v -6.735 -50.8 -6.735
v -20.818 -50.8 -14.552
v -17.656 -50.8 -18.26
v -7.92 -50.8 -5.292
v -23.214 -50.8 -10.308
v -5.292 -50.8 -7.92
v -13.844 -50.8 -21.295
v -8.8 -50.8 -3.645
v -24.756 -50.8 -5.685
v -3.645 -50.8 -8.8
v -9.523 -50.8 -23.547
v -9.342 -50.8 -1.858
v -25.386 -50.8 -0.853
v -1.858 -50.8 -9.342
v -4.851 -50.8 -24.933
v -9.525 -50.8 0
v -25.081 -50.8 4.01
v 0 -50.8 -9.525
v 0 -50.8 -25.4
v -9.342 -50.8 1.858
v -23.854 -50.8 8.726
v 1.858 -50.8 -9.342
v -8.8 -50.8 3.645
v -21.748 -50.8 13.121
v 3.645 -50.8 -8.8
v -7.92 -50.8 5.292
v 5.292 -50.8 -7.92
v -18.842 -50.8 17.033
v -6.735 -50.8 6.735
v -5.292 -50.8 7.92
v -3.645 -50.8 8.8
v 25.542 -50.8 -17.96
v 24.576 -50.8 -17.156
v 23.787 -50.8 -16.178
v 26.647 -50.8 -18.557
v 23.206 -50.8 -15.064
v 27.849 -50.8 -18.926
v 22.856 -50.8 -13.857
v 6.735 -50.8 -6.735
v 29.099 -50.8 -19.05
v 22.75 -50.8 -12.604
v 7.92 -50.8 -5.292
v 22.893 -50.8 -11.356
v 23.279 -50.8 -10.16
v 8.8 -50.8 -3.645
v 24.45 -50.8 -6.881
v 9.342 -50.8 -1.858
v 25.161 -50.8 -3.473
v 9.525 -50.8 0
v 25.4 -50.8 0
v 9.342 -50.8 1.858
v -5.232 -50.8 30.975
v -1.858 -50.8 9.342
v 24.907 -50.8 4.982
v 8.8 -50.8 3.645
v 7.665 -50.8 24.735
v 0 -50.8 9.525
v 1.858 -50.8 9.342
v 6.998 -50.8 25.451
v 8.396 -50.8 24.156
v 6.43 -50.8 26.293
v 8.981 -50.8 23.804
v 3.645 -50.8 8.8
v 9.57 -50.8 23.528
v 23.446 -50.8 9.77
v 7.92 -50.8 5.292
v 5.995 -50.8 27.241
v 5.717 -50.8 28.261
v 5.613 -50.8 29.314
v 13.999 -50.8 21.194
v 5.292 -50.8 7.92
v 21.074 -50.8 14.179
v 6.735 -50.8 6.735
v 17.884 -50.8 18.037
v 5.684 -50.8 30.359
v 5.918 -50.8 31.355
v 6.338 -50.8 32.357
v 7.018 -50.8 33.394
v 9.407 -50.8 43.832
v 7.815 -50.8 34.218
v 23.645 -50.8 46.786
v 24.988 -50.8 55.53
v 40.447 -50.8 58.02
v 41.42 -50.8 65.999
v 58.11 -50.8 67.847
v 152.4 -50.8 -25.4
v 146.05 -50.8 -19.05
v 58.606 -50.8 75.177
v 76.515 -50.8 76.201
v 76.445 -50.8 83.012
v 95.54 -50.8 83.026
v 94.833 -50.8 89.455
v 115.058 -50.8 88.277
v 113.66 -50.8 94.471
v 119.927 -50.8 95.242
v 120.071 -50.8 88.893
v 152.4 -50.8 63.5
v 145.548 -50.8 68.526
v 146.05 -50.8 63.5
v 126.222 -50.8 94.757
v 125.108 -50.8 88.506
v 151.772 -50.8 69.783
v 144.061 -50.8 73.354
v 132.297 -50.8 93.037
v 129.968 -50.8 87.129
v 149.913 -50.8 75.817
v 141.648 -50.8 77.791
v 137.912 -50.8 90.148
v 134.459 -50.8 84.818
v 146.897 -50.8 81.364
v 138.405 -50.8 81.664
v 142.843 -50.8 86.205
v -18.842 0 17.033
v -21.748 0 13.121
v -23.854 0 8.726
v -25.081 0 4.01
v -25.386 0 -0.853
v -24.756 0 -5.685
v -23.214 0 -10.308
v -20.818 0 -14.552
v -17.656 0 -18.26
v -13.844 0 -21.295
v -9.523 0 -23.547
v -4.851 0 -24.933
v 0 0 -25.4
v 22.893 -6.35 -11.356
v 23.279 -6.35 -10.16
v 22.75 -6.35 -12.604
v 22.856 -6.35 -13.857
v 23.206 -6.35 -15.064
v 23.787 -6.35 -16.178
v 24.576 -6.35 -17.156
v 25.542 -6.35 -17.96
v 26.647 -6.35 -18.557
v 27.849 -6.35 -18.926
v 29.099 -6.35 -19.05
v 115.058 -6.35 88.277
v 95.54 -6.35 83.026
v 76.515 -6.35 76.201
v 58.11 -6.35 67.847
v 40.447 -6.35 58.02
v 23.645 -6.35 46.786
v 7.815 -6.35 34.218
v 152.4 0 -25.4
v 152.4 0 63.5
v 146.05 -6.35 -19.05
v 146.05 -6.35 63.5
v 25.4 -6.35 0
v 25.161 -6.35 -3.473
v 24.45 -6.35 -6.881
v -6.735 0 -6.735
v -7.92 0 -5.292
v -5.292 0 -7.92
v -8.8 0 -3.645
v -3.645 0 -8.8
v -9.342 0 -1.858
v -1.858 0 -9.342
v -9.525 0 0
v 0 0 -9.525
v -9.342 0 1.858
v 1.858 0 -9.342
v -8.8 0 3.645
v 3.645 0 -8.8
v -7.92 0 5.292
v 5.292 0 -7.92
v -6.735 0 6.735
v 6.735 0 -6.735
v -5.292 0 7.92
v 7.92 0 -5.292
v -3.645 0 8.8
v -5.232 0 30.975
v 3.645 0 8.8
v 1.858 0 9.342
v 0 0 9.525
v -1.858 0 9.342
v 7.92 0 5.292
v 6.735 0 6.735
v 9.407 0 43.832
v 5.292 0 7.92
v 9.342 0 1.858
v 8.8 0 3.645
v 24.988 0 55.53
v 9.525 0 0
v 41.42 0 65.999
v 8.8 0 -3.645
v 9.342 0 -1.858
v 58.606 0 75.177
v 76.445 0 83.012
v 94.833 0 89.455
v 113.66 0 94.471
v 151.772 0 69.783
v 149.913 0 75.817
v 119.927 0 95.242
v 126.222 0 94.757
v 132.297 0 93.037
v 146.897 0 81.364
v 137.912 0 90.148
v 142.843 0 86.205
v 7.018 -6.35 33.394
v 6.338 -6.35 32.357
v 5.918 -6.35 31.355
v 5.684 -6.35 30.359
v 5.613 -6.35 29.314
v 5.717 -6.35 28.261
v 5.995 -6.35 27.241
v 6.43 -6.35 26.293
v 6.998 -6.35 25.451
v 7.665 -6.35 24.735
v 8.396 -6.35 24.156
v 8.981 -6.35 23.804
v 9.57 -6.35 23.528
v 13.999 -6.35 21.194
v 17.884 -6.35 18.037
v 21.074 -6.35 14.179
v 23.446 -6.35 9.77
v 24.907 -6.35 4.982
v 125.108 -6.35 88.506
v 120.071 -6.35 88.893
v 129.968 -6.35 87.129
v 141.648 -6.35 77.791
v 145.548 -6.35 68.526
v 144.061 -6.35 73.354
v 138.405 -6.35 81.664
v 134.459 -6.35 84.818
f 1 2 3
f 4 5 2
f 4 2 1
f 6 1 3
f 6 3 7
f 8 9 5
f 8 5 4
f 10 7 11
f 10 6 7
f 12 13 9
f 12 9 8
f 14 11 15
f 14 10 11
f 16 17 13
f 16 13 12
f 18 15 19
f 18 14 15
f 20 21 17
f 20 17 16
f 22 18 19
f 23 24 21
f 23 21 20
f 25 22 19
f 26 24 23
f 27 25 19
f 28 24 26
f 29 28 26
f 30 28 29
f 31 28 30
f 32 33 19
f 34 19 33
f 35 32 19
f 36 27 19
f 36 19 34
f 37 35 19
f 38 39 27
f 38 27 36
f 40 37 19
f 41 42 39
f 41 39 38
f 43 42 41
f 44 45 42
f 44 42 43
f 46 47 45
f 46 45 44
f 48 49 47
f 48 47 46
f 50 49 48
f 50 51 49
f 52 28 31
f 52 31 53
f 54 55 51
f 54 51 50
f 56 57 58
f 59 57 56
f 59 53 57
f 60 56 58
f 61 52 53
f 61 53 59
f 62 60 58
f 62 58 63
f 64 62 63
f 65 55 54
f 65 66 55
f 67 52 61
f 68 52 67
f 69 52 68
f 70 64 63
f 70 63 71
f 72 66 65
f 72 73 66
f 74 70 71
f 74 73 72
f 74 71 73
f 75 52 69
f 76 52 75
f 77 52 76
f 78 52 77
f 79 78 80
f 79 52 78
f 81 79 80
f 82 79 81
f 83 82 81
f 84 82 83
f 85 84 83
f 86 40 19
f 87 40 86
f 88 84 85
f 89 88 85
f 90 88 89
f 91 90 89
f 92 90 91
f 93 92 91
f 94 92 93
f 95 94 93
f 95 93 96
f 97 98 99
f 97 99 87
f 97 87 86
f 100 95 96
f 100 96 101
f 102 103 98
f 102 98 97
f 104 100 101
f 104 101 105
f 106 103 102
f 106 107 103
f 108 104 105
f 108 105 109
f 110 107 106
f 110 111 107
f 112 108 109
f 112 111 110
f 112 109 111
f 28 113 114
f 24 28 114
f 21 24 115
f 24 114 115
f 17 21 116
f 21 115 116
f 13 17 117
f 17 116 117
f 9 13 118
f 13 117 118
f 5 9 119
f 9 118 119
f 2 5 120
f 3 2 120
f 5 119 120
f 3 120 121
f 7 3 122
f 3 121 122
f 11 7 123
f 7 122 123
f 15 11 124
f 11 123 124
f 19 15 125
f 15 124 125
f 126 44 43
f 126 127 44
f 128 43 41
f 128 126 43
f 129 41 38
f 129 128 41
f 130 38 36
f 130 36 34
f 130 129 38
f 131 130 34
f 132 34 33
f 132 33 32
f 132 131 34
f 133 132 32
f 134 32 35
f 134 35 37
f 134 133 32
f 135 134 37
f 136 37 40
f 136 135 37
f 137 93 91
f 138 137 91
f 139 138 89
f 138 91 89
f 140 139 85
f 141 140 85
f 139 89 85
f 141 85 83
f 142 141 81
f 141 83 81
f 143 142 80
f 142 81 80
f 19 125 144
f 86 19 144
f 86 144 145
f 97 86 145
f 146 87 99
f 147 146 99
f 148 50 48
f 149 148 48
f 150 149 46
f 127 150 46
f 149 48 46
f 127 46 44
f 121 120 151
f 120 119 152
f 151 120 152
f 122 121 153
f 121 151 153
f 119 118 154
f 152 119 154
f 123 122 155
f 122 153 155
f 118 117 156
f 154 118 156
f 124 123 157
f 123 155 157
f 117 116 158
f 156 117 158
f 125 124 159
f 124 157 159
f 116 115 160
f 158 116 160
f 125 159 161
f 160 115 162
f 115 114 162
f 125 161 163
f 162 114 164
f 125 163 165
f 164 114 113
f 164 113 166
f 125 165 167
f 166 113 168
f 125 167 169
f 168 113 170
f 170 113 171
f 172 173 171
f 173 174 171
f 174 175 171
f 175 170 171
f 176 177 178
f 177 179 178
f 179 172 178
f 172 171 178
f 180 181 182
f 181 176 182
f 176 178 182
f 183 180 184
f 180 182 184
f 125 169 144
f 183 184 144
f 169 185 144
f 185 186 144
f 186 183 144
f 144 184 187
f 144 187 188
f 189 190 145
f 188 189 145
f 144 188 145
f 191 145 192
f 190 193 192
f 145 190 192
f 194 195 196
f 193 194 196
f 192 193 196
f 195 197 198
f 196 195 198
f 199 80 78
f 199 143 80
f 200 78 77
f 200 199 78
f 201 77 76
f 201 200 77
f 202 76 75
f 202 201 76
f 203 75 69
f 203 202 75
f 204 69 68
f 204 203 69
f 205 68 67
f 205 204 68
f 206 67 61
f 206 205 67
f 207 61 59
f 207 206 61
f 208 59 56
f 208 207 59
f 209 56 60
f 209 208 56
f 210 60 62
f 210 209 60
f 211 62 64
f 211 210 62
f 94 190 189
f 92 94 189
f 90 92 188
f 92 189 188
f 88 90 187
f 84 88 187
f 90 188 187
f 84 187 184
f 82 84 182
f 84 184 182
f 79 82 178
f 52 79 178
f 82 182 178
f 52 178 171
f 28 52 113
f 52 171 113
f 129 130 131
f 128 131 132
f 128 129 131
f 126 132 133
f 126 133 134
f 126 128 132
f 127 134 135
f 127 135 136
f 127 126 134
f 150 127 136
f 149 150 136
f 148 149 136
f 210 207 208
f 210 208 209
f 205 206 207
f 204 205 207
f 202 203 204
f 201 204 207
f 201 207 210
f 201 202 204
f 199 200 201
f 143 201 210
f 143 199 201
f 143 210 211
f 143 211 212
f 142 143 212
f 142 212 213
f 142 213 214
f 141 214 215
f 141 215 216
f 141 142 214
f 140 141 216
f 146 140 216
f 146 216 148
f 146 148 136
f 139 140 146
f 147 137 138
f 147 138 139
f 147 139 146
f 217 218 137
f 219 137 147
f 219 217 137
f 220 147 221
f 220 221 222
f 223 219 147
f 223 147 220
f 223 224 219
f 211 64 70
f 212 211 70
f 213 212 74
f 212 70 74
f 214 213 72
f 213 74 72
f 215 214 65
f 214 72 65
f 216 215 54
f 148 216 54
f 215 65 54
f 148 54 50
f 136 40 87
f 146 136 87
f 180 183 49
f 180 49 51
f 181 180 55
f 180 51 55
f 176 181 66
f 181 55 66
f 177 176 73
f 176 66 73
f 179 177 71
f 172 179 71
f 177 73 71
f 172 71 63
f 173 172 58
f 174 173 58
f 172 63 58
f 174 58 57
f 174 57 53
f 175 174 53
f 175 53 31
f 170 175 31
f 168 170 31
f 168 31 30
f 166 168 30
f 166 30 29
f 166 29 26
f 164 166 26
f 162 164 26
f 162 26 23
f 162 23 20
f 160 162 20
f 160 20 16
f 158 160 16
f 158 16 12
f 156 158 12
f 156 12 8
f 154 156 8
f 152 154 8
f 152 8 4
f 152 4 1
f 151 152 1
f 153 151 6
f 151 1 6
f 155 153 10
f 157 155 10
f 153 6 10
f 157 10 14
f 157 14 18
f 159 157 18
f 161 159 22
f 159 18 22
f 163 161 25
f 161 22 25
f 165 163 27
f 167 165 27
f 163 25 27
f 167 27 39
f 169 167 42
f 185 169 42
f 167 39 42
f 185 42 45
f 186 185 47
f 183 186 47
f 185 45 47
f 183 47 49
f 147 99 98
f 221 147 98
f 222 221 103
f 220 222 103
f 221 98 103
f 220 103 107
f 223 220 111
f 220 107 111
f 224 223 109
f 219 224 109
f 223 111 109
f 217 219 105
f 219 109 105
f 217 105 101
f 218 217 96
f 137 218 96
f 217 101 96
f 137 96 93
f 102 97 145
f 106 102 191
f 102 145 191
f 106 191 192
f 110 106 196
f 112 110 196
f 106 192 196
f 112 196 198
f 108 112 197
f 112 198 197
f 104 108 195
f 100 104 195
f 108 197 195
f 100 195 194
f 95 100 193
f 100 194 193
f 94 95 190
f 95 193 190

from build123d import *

# Parameters (mm, degrees)
F1_DEPTH = 50.8
F3_DEPTH = 44.45
F4_R     = 9.525
F5_DEPTH = 50.801
F6_R     = 6.35


with BuildPart() as f1:
    # F0 (on Front) → F1 (new body)
    with BuildSketch(Plane.XZ):
        with BuildLine():
            ThreePointArc((-18.842481, 17.032936), (9.125815, 23.703998), (25.4, 0))
            ThreePointArc((25.4, 0), (17.960512, -17.960512), (0, -25.4))
            Line((0, -25.4), (152.4, -25.4))
            Line((152.4, -25.4), (152.4, 63.5))
            ThreePointArc((152.4, 63.5), (100.824266, 38.70075), (113.659667, 94.470918))
            ThreePointArc((113.659667, 94.470918), (41.420002, 65.998851), (-18.842481, 17.032936))
        make_face()
        with BuildLine():
            ThreePointArc((152.4, 63.5), (140.475734, 88.29925), (113.659667, 94.470918))
            ThreePointArc((113.659667, 94.470918), (100.824266, 38.70075), (152.4, 63.5))
        make_face()
        with BuildLine():
            ThreePointArc((0, -25.4), (17.960512, -17.960512), (25.4, 0))
            ThreePointArc((25.4, 0), (9.125815, 23.703998), (-18.842481, 17.032936))
            ThreePointArc((-18.842481, 17.032936), (-23.214183, -10.308332), (0, -25.4))
        make_face()
    extrude(amount=F1_DEPTH)

    # F2 (on face) → F3 (cut)
    with BuildSketch(Plane.XZ.offset(50.8)):
        with BuildLine():
            ThreePointArc((115.057734, 88.276734), (52.250613, 64.79482), (-1.954932, 25.324657))
            ThreePointArc((-1.954932, 25.324657), (17.255503, 18.638874), (25.4, 0))
            ThreePointArc((25.4, 0), (23.150521, -10.450521), (16.800521, -19.05))
            Line((16.800521, -19.05), (146.05, -19.05))
            Line((146.05, -19.05), (146.05, 63.5))
            ThreePointArc((146.05, 63.5), (136.510587, 83.3394), (115.057734, 88.276734))
        make_face()
    extrude(amount=-F3_DEPTH, mode=Mode.SUBTRACT)

    # F4 (on face) → F5 (cut, through all)
    with BuildSketch(Plane.XZ.offset(50.8)):
        Circle(F4_R)
    extrude(amount=-F5_DEPTH, mode=Mode.SUBTRACT)

    # F6
    f6_edges = [f1.edges().sort_by_distance(p)[0] for p in [
        (16.800521, -28.575, -19.05),
        (-1.954932, -28.575, 25.324657),
    ]]
    fillet(f6_edges, radius=F6_R)


solid = f1.part
